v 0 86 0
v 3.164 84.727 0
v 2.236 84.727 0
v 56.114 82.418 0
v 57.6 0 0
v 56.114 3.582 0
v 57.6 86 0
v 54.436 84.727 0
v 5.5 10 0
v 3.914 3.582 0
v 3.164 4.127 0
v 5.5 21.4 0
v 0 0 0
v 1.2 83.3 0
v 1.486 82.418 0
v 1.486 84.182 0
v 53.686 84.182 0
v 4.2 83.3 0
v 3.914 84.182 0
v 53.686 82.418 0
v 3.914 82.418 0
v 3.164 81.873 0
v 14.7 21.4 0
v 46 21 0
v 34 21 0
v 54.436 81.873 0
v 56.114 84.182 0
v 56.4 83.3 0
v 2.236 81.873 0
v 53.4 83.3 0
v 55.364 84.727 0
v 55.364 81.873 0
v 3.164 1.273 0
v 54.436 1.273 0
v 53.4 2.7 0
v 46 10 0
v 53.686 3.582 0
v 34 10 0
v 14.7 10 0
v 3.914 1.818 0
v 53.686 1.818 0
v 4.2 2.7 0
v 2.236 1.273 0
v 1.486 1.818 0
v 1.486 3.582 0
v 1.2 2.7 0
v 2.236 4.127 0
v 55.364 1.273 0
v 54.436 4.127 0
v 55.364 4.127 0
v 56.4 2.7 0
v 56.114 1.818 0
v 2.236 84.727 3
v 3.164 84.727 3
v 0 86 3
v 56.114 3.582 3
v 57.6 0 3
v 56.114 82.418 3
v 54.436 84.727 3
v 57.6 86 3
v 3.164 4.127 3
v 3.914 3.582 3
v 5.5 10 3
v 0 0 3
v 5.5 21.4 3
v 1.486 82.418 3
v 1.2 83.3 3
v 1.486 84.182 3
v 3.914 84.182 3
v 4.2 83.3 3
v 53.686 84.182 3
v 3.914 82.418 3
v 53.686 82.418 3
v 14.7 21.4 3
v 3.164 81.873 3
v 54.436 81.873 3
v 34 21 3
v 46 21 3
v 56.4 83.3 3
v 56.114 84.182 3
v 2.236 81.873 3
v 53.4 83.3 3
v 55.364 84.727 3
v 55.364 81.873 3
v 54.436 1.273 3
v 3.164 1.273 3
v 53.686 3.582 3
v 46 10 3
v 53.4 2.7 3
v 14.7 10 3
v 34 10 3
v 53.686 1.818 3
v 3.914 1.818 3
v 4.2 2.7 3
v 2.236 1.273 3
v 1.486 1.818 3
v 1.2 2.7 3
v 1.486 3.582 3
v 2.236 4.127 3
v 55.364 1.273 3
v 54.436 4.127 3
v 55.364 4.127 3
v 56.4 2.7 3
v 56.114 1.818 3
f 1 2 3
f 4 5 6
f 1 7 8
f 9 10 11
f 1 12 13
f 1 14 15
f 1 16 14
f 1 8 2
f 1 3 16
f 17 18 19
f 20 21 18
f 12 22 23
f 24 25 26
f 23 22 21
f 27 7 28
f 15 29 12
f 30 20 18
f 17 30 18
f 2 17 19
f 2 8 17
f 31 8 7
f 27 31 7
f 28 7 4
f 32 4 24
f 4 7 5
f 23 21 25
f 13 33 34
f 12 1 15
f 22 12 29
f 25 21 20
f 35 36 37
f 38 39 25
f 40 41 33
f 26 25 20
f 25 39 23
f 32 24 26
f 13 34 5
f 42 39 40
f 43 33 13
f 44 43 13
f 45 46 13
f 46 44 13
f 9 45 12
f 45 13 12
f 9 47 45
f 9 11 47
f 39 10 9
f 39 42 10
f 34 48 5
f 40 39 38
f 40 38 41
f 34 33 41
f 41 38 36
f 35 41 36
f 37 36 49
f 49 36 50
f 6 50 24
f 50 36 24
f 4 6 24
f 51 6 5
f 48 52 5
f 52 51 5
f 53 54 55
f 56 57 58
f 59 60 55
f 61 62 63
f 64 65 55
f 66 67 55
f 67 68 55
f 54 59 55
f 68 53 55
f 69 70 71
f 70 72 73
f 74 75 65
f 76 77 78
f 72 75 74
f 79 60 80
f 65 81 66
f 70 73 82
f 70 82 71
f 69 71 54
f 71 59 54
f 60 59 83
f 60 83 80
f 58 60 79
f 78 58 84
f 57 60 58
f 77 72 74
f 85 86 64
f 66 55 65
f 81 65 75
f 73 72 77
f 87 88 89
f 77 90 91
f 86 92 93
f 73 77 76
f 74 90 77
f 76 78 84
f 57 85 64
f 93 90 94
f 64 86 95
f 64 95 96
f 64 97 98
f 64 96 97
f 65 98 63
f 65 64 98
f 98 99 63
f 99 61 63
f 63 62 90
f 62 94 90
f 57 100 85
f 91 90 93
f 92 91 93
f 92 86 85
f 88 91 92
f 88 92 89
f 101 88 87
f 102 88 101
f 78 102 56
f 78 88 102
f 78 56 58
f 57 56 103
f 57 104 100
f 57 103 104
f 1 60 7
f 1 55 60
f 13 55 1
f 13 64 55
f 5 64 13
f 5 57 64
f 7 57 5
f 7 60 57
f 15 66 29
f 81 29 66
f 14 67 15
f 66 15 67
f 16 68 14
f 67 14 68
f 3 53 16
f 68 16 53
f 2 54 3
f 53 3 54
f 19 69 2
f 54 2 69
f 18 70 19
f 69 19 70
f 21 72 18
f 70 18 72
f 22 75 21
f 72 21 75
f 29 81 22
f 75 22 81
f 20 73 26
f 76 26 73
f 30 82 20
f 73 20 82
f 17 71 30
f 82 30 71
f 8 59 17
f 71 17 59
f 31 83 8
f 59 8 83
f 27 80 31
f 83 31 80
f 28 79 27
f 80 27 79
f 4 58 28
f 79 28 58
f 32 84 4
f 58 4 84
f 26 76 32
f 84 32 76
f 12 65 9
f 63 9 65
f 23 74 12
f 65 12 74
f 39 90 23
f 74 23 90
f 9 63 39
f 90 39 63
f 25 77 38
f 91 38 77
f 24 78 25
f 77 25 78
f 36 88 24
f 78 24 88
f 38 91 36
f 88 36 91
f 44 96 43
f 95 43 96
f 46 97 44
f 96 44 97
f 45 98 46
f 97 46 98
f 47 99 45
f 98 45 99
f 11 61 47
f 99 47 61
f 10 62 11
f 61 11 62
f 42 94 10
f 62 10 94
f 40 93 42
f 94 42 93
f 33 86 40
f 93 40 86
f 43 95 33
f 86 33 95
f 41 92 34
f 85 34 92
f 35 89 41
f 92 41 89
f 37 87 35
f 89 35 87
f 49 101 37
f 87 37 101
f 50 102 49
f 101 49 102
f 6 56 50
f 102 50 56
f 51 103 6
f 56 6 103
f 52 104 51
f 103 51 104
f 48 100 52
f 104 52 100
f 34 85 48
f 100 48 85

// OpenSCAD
$fn = 10;

thickness_wall = 3;

case_size_internal = [51.6, 80];

distance_hole = 2.7;
hole_d = 3;

size_usb = [
    12,
    11
];

size_power = [
    9.2,
    11.4
];

pos_usb = [
    34,
    10
];

pos_power = [
    5.5,
    10
];

case_size = [
    case_size_internal.x + 2*thickness_wall,
    case_size_internal.y + 2*thickness_wall
];

holes_positions = [
    [distance_hole, distance_hole],
    [distance_hole, case_size.y - distance_hole],
    [case_size.x - distance_hole, distance_hole],
    [case_size.x - distance_hole, case_size.y - distance_hole]
];

linear_extrude(height=thickness_wall)
difference() {
    square(case_size);

    translate(pos_usb)
    square(size_usb);
    
    translate(pos_power)
    square(size_power);
    
    for (hole_pos = holes_positions) {
        translate(hole_pos)
        circle(d=hole_d);
    }
}
